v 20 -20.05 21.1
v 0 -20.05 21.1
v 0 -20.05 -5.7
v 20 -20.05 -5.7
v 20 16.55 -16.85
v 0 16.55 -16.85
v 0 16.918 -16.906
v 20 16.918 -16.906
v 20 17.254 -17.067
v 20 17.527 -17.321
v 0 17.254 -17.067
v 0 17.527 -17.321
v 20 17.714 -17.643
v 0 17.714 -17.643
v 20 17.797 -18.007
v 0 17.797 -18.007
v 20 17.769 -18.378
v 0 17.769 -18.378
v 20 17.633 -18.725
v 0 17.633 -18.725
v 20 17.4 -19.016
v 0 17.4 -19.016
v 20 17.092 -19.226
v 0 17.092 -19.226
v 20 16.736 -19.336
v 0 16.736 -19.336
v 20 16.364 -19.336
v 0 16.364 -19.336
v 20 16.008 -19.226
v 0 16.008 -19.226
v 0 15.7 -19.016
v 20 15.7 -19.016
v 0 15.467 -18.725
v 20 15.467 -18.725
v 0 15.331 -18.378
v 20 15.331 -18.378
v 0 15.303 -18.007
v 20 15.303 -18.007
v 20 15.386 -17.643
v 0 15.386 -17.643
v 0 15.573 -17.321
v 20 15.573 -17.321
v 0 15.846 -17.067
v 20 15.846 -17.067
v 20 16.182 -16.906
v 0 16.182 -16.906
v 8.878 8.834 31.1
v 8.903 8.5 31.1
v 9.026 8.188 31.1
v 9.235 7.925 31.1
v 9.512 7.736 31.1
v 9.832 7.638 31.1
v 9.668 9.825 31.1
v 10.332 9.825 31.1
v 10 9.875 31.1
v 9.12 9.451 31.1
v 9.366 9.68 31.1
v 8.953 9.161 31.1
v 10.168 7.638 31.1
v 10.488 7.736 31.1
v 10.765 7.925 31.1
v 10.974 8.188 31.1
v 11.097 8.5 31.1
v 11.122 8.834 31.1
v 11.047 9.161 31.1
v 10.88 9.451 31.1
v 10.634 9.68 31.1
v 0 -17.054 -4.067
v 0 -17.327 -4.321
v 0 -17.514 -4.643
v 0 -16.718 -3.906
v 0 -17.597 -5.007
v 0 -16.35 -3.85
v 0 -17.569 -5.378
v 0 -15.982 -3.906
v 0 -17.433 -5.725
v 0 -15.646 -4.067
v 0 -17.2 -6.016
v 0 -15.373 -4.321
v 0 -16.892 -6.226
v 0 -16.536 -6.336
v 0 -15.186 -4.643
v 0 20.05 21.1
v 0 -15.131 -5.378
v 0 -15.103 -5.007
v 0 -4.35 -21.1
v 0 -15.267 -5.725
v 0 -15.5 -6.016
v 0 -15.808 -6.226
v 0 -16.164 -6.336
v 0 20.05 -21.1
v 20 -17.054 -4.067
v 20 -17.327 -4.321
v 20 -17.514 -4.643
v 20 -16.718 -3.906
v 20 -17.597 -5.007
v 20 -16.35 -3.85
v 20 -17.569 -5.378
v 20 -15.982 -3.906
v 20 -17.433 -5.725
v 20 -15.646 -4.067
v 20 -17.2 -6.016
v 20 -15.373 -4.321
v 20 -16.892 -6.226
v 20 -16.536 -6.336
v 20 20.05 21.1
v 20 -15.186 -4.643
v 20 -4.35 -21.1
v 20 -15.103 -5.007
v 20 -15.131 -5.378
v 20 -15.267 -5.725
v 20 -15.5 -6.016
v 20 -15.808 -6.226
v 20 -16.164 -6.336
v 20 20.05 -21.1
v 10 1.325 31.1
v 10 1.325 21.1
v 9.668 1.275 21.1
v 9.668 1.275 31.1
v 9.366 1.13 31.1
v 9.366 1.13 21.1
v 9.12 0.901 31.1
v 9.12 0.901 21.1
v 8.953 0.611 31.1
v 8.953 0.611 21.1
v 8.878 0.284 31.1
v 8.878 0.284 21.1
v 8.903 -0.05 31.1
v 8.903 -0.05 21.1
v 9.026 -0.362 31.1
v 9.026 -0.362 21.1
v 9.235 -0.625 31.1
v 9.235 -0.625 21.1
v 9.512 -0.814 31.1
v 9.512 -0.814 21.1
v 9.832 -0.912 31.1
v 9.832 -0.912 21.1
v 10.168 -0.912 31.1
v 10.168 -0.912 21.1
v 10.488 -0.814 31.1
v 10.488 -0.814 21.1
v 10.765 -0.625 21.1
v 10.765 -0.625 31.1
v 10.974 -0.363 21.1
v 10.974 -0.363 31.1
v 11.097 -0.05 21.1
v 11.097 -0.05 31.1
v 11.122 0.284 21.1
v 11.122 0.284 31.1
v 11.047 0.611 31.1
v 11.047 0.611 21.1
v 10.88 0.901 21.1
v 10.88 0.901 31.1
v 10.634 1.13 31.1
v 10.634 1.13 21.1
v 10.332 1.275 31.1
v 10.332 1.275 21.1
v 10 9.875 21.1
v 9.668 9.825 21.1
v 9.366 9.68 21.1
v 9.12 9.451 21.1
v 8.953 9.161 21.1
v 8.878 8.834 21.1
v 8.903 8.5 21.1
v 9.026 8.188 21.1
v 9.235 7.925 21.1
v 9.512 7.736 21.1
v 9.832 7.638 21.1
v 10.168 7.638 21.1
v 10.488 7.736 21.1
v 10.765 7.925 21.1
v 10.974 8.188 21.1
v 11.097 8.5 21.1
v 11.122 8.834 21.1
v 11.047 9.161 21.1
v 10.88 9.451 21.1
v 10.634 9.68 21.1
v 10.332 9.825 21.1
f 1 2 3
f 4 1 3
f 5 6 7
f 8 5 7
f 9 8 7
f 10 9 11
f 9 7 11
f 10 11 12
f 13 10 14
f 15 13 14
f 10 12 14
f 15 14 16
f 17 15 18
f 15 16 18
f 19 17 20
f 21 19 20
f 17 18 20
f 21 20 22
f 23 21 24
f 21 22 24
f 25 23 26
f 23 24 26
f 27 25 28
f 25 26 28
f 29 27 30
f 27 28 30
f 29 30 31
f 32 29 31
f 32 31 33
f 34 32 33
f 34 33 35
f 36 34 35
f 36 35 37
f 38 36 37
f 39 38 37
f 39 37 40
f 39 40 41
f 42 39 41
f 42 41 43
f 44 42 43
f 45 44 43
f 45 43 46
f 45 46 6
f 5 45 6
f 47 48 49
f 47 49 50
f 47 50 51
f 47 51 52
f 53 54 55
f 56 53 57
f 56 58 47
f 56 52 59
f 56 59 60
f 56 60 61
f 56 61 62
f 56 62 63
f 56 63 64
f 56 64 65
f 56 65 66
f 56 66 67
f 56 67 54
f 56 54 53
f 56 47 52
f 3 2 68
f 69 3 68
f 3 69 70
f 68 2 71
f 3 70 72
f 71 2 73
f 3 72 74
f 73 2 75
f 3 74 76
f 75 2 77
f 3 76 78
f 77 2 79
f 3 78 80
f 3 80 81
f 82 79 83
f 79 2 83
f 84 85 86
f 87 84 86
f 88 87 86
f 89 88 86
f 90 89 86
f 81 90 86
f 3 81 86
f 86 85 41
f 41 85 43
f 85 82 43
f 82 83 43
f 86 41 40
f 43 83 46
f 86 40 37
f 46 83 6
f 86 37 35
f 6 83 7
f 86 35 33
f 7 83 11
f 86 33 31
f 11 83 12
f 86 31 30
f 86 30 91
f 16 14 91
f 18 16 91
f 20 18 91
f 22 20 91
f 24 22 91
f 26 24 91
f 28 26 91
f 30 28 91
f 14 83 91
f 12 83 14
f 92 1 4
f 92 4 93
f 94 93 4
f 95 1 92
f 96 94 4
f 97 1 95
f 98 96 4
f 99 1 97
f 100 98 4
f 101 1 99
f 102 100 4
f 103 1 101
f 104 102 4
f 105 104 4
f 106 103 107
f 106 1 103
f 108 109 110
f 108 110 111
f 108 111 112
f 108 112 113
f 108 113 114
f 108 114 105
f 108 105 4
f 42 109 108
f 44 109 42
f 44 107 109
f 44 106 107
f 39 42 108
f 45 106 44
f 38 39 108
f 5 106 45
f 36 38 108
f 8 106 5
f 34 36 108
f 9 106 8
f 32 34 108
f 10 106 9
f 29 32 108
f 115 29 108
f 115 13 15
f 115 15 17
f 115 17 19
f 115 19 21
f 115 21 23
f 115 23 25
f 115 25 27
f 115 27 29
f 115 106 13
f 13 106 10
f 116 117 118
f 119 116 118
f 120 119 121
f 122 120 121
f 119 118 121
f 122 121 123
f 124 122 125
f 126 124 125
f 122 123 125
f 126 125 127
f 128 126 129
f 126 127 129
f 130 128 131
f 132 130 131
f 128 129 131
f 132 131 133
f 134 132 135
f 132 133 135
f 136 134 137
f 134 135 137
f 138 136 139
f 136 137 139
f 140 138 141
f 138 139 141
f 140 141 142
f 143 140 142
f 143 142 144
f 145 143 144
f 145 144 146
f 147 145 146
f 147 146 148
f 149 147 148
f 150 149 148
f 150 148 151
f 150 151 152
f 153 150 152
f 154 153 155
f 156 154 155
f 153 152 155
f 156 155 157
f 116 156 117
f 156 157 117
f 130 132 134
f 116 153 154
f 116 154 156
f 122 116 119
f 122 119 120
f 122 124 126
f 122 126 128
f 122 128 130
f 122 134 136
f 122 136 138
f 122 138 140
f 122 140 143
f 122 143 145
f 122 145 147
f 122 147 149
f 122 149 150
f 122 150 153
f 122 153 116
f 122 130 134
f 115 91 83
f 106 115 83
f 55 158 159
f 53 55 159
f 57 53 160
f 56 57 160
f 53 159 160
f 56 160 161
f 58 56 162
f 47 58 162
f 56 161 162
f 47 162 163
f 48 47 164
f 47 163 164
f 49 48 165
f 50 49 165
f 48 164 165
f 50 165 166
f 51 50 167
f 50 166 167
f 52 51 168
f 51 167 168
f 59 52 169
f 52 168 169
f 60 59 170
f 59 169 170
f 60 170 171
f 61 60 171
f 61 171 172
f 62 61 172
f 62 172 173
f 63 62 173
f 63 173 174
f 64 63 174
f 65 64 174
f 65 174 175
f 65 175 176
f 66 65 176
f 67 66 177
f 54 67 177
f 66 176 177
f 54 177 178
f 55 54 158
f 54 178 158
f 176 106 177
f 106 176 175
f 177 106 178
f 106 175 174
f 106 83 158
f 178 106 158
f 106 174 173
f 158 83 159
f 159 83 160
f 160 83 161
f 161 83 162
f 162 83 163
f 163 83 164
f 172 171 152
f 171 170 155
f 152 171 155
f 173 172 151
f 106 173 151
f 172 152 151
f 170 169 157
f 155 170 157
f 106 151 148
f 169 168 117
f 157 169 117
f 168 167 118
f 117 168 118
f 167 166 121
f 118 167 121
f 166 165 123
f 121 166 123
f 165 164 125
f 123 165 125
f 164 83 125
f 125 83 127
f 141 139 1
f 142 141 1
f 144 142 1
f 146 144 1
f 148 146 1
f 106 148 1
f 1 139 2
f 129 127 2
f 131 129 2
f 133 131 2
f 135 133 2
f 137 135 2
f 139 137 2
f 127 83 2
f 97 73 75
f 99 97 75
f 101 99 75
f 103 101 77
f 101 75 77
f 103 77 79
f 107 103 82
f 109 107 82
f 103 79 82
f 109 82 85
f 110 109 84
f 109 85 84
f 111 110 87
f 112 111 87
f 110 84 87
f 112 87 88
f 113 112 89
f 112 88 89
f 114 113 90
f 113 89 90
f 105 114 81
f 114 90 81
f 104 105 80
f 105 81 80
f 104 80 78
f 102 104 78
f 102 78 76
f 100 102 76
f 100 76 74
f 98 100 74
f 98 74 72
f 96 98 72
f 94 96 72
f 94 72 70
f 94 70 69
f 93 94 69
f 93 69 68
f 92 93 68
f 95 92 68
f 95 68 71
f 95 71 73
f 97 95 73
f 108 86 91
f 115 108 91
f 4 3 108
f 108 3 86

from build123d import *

# Parameters (mm, degrees)
BOSS_EXTRUDE1_DEPTH        = 20
F_2_5_2_5_DIAMETER_HOLE1_D = 2.5
F_2_5_2_5_DIAMETER_HOLE2_D = 2.5
SKETCH6_R                  = 1.125
BOSS_EXTRUDE2_DEPTH        = 10


with BuildPart() as part:
    # Sketch1 → Boss-Extrude1 (new body)
    with BuildSketch(Plane(origin=(0, 0, 0), x_dir=(0, 0, -1), z_dir=(1, 0, 0))):
        Polygon((5.7, -20.05), (21.1, -4.35), (21.1, 20.05), (-21.1, 20.05), (-21.1, -20.05), align=None)
    extrude(amount=BOSS_EXTRUDE1_DEPTH)

    # Ø2.5 (2.5) Diameter Hole1 (through all)
    with Locations(Plane(origin=(20, 0, 0), x_dir=(0, 0, -1), z_dir=(1, 0, 0))):
        with Locations((18.1, 16.55)):
            Hole(F_2_5_2_5_DIAMETER_HOLE1_D / 2)

    # Ø2.5 (2.5) Diameter Hole2 (through all)
    with Locations(Plane(origin=(20, 0, 0), x_dir=(0, 0, -1), z_dir=(1, 0, 0))):
        with Locations((5.1, -16.35)):
            Hole(F_2_5_2_5_DIAMETER_HOLE2_D / 2)

    # Sketch6 → Boss-Extrude2 (add)
    with BuildSketch(Plane.XY.offset(21.1)):
        with Locations(Location((10, 8.75, 0), (0, 0, 90))):
            Circle(SKETCH6_R)
        with Locations(Location((10, 0.2, 0), (0, 0, 90))):
            Circle(SKETCH6_R)
    extrude(amount=BOSS_EXTRUDE2_DEPTH)


solid = part.part
